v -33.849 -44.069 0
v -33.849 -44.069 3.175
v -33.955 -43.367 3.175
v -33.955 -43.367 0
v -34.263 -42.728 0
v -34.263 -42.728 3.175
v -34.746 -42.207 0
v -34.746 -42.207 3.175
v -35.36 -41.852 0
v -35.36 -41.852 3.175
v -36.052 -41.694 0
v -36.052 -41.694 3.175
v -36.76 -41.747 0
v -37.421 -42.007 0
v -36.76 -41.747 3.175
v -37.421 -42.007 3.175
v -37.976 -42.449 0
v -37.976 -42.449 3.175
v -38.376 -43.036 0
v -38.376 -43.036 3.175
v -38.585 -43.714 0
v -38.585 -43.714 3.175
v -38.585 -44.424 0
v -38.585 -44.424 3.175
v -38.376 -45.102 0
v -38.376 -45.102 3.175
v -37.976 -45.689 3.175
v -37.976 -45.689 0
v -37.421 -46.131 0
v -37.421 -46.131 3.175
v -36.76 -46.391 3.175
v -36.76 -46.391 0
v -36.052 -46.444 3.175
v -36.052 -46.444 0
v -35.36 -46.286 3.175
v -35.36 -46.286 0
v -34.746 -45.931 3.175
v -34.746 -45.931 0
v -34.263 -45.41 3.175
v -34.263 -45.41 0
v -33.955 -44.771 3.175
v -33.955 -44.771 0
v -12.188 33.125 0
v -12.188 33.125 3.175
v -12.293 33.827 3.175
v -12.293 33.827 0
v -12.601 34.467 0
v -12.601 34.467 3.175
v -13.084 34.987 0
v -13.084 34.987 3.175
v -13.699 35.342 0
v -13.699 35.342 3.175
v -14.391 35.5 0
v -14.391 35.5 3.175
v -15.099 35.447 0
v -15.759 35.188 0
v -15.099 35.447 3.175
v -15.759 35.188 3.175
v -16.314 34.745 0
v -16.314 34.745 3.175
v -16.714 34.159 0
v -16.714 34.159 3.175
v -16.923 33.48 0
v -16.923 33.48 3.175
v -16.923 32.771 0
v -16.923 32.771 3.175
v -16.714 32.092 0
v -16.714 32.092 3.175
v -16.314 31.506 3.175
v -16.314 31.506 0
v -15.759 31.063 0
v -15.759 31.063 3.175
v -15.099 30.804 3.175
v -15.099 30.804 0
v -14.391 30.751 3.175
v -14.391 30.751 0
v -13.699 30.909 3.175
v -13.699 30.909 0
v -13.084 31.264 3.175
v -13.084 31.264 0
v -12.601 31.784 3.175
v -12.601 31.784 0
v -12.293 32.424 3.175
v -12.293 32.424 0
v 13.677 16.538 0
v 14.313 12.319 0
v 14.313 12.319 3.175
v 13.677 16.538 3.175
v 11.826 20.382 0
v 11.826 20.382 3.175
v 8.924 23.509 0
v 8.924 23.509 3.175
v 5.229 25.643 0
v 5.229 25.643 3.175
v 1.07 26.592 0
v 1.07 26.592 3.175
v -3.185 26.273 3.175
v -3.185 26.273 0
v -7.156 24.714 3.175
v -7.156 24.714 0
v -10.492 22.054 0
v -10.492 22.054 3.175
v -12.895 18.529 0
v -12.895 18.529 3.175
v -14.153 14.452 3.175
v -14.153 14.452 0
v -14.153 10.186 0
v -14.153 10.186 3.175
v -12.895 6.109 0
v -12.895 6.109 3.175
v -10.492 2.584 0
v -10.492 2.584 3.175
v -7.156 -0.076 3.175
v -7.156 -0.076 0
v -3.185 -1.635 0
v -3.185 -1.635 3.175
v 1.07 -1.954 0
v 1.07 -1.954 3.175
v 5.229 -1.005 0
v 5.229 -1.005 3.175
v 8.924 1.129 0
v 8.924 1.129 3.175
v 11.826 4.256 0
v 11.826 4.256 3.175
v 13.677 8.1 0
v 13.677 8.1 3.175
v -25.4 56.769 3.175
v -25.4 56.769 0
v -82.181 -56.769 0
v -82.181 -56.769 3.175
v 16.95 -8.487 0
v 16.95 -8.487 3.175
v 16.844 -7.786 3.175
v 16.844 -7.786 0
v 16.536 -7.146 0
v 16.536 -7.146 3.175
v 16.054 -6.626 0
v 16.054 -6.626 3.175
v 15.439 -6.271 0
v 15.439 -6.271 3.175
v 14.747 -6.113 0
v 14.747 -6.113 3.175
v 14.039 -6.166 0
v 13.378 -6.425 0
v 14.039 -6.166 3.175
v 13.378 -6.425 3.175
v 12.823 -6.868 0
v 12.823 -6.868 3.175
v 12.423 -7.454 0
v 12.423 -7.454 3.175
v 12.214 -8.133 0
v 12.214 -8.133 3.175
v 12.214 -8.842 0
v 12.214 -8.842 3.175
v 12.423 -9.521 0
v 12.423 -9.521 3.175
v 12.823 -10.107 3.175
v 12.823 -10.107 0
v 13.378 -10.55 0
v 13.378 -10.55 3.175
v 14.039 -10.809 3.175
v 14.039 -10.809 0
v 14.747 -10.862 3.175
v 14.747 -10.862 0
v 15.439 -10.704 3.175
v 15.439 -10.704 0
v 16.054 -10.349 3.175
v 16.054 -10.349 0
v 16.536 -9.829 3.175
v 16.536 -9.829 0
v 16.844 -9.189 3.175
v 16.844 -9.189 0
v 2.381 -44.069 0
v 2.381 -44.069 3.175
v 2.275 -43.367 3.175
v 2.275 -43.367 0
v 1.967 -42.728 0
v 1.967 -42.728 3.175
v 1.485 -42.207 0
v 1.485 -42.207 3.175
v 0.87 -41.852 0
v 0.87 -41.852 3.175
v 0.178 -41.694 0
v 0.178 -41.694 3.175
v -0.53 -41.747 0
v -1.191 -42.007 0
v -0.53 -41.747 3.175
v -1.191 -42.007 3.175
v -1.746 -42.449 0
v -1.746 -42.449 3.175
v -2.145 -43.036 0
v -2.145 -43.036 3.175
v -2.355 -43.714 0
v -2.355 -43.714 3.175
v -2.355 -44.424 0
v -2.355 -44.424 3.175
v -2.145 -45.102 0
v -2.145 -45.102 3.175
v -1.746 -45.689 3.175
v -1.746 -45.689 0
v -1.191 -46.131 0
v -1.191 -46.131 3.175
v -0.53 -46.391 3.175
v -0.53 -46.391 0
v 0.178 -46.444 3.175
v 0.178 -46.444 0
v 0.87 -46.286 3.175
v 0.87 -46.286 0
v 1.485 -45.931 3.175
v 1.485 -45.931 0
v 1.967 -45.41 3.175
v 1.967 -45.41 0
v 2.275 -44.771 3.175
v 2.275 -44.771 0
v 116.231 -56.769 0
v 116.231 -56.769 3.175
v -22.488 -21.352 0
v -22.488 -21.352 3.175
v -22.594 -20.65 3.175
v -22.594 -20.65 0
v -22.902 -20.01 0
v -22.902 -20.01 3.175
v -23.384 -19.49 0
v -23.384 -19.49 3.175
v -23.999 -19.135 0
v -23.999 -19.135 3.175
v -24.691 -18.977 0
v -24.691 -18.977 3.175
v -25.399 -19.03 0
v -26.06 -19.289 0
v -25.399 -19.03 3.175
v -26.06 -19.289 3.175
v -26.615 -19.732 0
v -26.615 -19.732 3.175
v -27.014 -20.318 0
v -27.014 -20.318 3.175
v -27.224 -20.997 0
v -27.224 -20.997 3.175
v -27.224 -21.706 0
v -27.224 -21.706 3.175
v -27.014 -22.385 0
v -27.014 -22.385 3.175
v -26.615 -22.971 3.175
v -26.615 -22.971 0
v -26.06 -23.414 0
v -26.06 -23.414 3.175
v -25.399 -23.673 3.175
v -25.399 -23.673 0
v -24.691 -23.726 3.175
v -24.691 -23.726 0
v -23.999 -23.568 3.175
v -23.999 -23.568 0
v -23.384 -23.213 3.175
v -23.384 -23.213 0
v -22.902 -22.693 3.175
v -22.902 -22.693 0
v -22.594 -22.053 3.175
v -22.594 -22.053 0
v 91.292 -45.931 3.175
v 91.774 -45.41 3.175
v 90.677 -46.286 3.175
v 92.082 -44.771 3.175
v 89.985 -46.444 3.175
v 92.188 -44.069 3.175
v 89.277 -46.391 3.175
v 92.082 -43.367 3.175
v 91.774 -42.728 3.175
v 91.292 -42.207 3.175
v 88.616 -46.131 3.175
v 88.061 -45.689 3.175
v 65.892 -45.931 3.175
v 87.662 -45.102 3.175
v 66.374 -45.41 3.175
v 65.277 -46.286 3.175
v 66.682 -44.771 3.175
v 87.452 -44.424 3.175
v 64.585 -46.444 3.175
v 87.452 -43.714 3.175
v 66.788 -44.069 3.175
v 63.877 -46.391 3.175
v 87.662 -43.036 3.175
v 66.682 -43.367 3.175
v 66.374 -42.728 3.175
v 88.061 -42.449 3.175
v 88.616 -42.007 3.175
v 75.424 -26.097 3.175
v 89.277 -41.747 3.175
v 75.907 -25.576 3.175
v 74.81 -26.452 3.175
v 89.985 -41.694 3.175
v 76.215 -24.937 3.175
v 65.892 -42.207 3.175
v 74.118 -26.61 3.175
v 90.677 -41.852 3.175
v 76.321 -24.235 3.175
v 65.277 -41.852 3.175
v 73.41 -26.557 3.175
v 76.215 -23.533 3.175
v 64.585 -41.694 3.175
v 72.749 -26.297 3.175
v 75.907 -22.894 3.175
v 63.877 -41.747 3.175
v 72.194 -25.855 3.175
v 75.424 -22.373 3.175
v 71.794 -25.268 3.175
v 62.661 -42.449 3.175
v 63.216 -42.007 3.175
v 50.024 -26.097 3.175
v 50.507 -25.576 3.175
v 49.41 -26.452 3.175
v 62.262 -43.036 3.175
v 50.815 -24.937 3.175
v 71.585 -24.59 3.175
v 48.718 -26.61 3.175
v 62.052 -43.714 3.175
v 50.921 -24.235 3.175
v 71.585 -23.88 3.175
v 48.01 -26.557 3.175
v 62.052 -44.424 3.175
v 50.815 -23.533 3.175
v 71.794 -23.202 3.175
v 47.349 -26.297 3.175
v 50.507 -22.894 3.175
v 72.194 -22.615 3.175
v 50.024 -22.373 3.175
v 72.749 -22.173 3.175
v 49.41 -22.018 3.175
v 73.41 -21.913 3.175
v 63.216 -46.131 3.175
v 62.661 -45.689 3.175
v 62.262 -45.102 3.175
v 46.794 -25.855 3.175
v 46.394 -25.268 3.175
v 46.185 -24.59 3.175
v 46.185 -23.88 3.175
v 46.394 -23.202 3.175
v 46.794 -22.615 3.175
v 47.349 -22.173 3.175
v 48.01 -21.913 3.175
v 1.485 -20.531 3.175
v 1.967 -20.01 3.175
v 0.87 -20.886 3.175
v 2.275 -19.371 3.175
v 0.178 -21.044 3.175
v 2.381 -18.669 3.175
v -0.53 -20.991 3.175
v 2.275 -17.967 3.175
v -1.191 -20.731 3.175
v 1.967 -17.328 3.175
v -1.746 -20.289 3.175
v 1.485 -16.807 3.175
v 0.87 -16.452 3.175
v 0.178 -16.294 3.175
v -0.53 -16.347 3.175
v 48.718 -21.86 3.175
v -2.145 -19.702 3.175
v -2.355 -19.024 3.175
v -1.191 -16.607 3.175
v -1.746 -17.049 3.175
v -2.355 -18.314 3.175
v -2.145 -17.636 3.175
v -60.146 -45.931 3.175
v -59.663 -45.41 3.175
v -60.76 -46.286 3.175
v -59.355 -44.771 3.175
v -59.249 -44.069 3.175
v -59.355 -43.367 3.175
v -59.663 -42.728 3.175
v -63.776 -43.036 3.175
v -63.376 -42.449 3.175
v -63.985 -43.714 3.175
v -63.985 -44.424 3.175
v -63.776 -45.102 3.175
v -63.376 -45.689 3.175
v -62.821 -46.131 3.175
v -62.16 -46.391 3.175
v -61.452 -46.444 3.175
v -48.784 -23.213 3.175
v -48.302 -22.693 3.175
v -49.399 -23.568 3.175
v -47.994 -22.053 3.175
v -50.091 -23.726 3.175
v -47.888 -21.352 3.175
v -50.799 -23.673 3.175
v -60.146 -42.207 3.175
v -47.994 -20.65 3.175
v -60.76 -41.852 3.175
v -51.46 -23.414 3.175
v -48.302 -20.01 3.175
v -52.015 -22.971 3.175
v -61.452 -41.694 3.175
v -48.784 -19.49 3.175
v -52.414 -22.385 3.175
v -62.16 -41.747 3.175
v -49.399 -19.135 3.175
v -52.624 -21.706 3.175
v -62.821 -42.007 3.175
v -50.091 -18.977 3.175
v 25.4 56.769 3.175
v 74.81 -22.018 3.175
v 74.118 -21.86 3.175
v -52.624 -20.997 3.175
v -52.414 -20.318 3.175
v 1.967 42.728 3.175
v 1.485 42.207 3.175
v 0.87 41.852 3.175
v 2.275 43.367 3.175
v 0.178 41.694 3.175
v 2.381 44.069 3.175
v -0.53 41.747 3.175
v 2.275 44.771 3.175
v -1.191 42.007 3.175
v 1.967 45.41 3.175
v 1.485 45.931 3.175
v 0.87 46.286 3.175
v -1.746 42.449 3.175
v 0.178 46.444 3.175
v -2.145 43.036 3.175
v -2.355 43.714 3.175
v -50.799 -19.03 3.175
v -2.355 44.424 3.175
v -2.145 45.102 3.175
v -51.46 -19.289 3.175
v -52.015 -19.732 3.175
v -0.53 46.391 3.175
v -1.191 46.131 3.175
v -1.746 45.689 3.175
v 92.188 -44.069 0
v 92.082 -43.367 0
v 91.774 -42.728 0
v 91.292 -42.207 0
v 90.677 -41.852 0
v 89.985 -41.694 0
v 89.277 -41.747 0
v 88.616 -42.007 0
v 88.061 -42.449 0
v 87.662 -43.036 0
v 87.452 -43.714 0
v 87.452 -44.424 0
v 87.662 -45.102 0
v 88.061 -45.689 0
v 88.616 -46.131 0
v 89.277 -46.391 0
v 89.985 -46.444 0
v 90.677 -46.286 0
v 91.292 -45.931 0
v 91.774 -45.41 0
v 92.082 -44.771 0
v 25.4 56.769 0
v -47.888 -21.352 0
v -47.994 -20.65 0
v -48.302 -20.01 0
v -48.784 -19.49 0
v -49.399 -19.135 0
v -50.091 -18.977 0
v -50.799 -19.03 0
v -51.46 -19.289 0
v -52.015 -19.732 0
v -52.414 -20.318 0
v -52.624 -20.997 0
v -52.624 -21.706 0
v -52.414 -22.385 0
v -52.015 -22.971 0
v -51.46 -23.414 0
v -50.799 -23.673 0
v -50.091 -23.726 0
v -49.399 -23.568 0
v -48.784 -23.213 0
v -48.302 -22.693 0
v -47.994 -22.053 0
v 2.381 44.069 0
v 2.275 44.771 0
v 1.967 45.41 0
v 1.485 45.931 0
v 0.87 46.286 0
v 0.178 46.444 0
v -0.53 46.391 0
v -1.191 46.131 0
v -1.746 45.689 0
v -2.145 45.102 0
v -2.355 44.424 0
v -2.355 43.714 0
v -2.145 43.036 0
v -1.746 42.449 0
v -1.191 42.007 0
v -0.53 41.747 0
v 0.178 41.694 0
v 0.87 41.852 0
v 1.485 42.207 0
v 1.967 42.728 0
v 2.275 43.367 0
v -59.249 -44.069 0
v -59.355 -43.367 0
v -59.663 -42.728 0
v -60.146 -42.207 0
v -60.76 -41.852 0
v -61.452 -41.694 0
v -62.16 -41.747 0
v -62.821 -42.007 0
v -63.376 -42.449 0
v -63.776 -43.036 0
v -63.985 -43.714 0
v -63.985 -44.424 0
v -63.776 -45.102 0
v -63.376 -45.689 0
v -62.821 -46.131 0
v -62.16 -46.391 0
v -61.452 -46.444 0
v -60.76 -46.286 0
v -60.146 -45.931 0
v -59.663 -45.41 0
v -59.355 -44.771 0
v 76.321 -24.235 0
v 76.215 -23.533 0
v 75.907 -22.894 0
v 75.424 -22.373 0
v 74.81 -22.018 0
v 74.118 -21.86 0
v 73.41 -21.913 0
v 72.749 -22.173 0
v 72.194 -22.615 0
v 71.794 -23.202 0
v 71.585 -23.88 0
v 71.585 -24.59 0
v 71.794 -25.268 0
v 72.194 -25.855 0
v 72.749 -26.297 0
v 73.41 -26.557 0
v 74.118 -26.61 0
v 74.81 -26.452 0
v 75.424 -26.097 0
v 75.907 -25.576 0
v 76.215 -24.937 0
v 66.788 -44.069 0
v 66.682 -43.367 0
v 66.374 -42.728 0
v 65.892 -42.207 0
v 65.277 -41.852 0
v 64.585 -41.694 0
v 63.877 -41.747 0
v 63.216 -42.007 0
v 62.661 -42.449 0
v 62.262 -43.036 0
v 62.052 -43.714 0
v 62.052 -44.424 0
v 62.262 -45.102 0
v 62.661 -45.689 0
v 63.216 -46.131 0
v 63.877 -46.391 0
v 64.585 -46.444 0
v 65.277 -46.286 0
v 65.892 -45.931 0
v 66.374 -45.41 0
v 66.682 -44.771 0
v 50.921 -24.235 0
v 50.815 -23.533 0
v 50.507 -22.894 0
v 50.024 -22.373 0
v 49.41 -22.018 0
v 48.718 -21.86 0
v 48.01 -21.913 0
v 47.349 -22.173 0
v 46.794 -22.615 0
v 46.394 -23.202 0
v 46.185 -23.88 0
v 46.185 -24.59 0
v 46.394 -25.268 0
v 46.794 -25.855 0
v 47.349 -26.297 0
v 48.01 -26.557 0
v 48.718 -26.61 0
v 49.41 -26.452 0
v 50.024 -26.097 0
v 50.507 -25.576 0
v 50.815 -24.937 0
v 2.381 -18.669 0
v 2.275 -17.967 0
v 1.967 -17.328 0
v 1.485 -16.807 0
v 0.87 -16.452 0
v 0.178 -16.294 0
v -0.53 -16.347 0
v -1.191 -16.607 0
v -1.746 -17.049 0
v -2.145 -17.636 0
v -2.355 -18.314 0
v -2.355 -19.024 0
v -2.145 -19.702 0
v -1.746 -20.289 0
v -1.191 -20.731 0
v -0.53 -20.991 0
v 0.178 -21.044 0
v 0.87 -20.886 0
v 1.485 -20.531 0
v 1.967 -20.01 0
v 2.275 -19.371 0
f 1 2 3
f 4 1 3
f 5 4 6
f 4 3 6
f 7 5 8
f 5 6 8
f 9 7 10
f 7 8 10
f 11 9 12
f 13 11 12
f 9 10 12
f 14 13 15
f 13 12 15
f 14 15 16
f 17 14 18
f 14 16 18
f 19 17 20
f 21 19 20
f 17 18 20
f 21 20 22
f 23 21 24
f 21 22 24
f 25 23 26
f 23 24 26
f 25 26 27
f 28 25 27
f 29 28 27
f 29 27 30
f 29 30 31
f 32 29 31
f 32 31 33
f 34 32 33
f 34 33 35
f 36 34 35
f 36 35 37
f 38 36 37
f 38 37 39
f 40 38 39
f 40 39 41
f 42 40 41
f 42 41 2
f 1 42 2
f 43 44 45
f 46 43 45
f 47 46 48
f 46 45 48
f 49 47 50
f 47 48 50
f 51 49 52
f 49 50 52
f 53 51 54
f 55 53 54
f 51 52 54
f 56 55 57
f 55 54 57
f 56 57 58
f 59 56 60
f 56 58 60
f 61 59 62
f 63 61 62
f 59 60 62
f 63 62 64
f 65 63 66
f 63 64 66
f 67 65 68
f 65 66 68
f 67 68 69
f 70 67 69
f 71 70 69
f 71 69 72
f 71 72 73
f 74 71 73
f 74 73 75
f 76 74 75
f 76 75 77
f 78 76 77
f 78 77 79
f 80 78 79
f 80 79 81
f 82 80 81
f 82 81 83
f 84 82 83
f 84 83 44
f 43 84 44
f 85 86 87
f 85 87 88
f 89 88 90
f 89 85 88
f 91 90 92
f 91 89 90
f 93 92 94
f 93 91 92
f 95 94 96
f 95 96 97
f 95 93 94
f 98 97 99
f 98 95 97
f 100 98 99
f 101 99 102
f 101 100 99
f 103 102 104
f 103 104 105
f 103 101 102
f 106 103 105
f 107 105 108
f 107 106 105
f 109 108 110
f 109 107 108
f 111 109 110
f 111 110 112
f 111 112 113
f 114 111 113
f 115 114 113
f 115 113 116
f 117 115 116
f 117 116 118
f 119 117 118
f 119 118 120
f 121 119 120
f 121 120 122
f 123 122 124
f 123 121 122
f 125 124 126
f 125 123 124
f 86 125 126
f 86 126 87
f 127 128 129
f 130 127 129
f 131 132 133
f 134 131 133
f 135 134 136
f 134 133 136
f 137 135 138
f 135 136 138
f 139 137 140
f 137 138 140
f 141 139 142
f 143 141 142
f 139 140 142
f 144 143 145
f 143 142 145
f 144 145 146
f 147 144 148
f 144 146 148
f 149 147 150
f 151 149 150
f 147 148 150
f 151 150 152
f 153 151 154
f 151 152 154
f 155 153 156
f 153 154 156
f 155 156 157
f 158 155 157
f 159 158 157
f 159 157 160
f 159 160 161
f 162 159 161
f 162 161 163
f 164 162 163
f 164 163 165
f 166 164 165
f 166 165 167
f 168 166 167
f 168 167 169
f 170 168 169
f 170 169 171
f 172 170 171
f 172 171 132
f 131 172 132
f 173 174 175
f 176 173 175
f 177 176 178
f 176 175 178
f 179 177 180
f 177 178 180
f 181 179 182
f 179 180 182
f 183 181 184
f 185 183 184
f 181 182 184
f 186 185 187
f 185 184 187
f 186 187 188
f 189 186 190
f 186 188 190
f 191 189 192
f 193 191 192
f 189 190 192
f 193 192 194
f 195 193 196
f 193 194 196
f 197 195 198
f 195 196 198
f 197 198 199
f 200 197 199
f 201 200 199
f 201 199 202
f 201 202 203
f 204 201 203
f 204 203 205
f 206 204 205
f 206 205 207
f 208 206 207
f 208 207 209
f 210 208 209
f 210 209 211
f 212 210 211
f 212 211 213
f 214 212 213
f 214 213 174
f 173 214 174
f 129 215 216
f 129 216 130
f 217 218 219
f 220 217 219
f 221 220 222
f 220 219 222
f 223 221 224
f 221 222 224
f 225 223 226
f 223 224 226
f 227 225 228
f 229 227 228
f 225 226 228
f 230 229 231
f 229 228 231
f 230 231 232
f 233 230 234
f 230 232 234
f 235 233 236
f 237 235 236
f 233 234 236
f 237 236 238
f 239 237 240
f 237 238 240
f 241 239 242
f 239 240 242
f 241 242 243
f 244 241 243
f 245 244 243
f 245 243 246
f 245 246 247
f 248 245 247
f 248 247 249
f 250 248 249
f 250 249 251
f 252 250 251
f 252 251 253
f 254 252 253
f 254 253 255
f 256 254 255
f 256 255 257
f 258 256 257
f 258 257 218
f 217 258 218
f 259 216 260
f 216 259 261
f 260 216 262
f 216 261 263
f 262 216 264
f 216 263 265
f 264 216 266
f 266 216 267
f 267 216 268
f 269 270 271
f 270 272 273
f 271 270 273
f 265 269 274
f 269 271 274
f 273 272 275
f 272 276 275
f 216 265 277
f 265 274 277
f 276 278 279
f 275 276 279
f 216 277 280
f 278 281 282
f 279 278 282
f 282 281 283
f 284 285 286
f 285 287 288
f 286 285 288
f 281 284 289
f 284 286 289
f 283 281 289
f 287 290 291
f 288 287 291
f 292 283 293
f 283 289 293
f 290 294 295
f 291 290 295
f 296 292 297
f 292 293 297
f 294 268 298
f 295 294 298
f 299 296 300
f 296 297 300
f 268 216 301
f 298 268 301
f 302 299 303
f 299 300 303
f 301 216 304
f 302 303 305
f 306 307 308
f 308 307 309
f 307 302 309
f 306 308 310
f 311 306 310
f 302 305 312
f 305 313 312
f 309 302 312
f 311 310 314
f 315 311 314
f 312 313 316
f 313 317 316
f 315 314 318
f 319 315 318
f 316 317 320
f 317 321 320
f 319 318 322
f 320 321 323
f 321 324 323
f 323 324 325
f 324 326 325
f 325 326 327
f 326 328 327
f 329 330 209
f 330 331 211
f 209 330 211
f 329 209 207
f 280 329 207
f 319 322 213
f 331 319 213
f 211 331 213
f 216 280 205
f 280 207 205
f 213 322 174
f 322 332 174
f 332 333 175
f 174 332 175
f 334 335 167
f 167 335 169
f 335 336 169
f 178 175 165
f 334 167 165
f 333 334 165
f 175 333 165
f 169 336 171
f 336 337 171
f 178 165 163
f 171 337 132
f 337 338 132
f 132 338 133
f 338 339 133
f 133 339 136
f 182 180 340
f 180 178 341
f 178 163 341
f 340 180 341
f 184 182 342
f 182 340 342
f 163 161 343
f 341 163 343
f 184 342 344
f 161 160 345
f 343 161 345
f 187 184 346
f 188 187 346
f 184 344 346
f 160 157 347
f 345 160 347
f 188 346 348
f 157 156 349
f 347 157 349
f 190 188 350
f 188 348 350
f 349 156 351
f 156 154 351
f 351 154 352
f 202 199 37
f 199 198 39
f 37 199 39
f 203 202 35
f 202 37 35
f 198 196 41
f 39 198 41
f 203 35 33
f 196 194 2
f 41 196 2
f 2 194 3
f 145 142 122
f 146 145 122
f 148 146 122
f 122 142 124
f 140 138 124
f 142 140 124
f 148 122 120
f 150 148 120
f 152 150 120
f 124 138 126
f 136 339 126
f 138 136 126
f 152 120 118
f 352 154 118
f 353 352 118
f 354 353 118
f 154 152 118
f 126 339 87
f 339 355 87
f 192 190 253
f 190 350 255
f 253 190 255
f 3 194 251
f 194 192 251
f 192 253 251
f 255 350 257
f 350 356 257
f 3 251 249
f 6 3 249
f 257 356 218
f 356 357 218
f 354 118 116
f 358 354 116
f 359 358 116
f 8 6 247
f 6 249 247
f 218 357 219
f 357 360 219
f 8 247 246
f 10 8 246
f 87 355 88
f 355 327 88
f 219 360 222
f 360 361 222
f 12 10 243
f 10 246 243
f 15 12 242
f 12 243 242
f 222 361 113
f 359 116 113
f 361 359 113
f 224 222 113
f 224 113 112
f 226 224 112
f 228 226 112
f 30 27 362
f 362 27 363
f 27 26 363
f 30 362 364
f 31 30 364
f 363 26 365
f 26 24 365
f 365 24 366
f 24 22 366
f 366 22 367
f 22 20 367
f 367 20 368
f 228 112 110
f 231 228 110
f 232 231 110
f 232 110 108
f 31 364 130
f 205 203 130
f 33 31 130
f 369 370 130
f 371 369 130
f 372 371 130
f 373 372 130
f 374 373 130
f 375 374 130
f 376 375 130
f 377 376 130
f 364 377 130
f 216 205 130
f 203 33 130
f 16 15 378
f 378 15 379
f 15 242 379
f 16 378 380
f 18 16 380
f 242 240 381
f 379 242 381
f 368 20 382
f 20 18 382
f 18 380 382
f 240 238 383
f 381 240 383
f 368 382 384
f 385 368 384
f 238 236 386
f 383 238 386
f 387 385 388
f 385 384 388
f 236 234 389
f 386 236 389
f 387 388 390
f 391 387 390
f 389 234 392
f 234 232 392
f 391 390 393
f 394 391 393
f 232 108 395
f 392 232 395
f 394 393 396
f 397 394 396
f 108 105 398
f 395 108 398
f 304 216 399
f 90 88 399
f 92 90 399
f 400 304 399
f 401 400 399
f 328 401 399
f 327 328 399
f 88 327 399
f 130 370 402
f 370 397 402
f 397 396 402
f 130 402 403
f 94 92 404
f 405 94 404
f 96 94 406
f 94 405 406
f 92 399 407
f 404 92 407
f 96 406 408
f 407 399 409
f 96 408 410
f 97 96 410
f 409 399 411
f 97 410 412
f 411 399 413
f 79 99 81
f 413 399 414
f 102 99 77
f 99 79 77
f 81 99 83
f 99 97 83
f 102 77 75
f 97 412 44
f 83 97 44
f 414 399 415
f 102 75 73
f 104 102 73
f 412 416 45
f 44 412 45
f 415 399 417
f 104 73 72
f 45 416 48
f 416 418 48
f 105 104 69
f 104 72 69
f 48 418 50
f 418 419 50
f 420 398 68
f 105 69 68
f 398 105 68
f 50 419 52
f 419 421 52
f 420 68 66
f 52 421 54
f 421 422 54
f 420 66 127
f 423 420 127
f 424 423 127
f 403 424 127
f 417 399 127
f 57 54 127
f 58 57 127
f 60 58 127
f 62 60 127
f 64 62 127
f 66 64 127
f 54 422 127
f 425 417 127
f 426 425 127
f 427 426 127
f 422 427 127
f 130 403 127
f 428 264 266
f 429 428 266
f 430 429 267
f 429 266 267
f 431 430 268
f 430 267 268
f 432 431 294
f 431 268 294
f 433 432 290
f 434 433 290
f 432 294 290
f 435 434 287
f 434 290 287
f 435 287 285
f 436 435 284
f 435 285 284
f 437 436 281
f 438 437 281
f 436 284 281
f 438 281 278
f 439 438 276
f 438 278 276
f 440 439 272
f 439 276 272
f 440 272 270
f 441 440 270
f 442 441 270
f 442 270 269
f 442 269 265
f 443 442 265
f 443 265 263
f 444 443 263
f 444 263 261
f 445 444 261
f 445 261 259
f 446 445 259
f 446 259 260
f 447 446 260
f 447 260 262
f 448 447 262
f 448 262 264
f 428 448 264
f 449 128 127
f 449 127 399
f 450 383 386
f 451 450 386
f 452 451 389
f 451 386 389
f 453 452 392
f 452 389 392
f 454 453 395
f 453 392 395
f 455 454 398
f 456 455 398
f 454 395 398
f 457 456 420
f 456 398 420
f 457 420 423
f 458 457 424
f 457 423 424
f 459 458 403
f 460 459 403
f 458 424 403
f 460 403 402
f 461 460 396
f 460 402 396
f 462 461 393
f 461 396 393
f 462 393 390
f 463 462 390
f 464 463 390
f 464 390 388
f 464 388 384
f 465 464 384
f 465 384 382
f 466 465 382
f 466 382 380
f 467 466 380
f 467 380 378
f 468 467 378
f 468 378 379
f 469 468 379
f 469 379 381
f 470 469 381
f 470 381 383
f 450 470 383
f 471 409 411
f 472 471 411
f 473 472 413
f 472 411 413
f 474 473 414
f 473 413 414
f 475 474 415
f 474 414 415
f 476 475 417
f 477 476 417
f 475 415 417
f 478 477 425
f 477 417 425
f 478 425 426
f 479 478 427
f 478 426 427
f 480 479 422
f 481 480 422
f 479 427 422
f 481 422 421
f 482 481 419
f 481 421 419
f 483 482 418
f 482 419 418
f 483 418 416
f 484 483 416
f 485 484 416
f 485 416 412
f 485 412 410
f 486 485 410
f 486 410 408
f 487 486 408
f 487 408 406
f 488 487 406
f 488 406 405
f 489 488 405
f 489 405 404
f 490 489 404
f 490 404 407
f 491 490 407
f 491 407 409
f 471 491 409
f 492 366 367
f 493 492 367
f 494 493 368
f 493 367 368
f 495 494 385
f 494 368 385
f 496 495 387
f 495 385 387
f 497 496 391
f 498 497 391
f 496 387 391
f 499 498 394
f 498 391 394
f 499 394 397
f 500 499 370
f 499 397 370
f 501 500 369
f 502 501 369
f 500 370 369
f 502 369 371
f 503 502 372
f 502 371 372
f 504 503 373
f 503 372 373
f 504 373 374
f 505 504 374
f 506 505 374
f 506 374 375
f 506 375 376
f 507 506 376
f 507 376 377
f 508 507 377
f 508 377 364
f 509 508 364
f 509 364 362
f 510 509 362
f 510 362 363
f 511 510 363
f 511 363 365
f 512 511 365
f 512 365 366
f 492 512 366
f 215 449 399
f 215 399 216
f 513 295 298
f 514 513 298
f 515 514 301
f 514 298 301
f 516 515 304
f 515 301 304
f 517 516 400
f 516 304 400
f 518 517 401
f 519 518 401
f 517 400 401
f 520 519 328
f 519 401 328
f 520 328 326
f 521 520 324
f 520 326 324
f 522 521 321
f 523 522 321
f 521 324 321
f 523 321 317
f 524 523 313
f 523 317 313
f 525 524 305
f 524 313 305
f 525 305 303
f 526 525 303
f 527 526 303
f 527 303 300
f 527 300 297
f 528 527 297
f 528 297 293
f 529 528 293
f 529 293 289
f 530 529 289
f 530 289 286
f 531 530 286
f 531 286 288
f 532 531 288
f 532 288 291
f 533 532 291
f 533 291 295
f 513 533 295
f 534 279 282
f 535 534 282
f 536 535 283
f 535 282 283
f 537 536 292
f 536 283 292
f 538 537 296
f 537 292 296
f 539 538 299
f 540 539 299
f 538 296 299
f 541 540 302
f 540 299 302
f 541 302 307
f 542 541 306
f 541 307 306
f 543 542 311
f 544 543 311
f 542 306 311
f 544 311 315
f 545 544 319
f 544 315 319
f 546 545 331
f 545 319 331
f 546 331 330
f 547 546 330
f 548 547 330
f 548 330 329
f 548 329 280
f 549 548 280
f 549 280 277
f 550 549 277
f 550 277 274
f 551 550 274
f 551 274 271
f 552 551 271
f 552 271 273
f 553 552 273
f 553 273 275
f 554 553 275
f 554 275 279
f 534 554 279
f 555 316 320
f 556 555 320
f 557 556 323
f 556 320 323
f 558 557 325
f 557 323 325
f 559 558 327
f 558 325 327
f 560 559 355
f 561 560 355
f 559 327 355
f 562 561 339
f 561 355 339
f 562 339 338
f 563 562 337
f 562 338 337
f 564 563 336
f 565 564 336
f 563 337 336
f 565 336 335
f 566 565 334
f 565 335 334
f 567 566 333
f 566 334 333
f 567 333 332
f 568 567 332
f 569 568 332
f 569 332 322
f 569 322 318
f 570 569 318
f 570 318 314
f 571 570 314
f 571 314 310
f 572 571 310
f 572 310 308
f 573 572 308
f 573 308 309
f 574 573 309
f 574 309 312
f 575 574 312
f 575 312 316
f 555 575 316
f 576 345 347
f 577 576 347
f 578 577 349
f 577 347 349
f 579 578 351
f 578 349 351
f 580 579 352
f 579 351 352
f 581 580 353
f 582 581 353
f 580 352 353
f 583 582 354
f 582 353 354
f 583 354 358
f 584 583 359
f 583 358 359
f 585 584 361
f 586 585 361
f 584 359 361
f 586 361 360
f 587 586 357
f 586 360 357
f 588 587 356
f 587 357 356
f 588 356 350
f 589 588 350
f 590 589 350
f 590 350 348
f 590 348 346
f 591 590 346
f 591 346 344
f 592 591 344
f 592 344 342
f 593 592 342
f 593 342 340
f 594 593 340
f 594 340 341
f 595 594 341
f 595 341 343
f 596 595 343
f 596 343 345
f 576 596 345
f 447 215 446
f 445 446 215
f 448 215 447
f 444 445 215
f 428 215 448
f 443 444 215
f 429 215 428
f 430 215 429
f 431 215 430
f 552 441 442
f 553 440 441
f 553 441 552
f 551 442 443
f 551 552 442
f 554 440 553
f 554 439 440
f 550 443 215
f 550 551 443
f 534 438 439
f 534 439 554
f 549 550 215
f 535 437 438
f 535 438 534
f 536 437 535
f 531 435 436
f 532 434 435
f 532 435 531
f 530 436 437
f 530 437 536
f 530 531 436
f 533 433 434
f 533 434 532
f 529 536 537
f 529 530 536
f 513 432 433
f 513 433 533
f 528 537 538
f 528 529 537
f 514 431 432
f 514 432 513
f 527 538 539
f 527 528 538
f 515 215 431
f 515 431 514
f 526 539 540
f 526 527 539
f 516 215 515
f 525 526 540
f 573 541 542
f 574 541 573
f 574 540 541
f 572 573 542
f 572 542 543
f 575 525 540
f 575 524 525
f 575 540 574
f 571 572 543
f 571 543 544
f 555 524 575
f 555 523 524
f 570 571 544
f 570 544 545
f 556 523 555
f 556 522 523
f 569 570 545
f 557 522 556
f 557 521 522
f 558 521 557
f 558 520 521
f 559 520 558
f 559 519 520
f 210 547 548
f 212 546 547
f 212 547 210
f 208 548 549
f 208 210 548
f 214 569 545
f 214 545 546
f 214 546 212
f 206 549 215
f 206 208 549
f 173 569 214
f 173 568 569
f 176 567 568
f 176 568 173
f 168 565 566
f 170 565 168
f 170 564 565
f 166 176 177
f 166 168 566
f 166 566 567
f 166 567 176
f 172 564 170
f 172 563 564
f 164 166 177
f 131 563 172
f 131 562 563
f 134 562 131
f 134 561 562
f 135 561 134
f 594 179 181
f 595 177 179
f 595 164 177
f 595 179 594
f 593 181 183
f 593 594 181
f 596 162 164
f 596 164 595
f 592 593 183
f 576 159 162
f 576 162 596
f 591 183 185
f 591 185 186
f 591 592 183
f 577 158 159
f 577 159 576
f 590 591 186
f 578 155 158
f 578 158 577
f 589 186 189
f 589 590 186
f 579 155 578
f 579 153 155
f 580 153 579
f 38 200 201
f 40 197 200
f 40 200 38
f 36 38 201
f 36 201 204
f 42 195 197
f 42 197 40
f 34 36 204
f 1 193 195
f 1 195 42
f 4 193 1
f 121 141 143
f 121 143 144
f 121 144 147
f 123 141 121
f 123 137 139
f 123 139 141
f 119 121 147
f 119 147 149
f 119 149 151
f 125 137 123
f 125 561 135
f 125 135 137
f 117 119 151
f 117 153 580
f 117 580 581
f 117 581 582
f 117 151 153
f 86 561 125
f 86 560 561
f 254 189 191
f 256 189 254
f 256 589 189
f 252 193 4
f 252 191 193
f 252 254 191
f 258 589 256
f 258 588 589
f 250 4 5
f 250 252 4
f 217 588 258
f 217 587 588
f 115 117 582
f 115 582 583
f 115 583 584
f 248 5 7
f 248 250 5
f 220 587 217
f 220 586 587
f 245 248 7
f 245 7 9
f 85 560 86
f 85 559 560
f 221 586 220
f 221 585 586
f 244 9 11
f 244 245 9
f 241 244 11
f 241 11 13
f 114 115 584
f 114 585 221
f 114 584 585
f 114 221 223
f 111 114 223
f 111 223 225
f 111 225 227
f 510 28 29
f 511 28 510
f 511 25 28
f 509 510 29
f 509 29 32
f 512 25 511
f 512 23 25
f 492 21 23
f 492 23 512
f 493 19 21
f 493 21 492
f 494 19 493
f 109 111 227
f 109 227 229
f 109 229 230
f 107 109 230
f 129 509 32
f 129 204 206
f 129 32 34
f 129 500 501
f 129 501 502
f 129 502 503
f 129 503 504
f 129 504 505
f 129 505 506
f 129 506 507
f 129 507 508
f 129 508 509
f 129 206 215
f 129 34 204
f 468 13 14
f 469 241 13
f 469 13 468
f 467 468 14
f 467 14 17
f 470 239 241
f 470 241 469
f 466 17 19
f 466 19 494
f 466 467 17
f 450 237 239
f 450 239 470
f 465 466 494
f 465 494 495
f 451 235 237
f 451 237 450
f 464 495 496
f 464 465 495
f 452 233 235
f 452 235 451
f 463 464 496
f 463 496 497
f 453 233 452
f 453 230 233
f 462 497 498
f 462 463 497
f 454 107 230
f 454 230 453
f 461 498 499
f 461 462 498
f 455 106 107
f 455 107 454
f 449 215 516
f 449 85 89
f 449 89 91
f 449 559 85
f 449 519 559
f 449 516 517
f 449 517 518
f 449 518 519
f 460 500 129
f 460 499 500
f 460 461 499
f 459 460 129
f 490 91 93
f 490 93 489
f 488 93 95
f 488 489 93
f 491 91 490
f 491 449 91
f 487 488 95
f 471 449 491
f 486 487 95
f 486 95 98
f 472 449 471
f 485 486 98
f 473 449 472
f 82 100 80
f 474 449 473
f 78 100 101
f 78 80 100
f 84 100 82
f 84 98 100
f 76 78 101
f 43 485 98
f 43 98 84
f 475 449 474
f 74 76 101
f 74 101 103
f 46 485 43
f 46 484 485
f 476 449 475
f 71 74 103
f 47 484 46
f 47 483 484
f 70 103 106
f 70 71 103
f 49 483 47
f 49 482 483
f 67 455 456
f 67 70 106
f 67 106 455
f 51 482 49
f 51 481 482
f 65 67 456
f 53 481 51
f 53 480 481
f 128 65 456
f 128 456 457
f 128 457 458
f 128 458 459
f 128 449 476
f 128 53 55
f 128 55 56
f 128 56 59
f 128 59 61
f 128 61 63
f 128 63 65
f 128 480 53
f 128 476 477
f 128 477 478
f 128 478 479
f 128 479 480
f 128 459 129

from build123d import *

# Parameters (mm, degrees)
SKETCH1_W           = 50.8
SKETCH1_H           = 113.538
SKETCH1_R           = 14.3129
BOSS_EXTRUDE1_DEPTH = 3.175
SKETCH2_R           = 2.38125
CUT_EXTRUDE1_DEPTH  = 130.392622385
SKETCH3_R           = 2.38125
CUT_EXTRUDE2_DEPTH  = 130.392622385
SKETCH4_R           = 2.38125
CUT_EXTRUDE3_DEPTH  = 130.392622385


with BuildPart() as part:
    # Sketch1 → Boss-Extrude1 (new body)
    # profile 1 of 3: a face of its own
    with BuildSketch(Plane.XY):
        Polygon((-25.4, 56.769), (-82.181258838, -56.769), (-25.4, -56.769), align=None)
    # profile 2 of 3: a face of its own
    with BuildSketch(Plane.XY):
        Rectangle(SKETCH1_W, SKETCH1_H)
        with Locations((0, 12.319)):
            Circle(SKETCH1_R, mode=Mode.SUBTRACT)
    # profile 3 of 3: a face of its own
    with BuildSketch(Plane.XY):
        Polygon((116.231023146, -56.769), (25.4, -56.769), (25.4, 56.769), align=None)
    extrude(amount=BOSS_EXTRUDE1_DEPTH)

    # Sketch2 → Cut-Extrude1 (cut, through all)
    with BuildSketch(Plane.XY.offset(3.175)):
        with Locations((-61.630242658, -44.069)):
            Circle(SKETCH2_R)
        with Locations((-36.230242658, -44.069)):
            Circle(SKETCH2_R)
        with Locations((-50.269055108, -21.351530567)):
            Circle(SKETCH2_R)
        with Locations((-24.869055108, -21.351530567)):
            Circle(SKETCH2_R)
        with Locations((64.406974336, -44.069)):
            Circle(SKETCH2_R)
        with Locations((89.806974336, -44.069)):
            Circle(SKETCH2_R)
        with Locations((48.539653752, -24.234985342)):
            Circle(SKETCH2_R)
        with Locations((73.939653752, -24.234985342)):
            Circle(SKETCH2_R)
    extrude(amount=-CUT_EXTRUDE1_DEPTH, mode=Mode.SUBTRACT)

    # Sketch3 → Cut-Extrude2 (cut, through all)
    with BuildSketch(Plane.XY.offset(3.175)):
        with Locations((0, 44.069)):
            Circle(SKETCH3_R)
        with Locations((0, -18.669)):
            Circle(SKETCH3_R)
        with Locations((0, -44.069)):
            Circle(SKETCH3_R)
    extrude(amount=-CUT_EXTRUDE2_DEPTH, mode=Mode.SUBTRACT)

    # Sketch4 → Cut-Extrude3 (cut, through all)
    with BuildSketch(Plane.XY.offset(3.175)):
        with Locations((-14.568841483, 33.125461925)):
            Circle(SKETCH4_R)
        with Locations((14.568841483, -8.487461925)):
            Circle(SKETCH4_R)
    extrude(amount=-CUT_EXTRUDE3_DEPTH, mode=Mode.SUBTRACT)


solid = part.part
